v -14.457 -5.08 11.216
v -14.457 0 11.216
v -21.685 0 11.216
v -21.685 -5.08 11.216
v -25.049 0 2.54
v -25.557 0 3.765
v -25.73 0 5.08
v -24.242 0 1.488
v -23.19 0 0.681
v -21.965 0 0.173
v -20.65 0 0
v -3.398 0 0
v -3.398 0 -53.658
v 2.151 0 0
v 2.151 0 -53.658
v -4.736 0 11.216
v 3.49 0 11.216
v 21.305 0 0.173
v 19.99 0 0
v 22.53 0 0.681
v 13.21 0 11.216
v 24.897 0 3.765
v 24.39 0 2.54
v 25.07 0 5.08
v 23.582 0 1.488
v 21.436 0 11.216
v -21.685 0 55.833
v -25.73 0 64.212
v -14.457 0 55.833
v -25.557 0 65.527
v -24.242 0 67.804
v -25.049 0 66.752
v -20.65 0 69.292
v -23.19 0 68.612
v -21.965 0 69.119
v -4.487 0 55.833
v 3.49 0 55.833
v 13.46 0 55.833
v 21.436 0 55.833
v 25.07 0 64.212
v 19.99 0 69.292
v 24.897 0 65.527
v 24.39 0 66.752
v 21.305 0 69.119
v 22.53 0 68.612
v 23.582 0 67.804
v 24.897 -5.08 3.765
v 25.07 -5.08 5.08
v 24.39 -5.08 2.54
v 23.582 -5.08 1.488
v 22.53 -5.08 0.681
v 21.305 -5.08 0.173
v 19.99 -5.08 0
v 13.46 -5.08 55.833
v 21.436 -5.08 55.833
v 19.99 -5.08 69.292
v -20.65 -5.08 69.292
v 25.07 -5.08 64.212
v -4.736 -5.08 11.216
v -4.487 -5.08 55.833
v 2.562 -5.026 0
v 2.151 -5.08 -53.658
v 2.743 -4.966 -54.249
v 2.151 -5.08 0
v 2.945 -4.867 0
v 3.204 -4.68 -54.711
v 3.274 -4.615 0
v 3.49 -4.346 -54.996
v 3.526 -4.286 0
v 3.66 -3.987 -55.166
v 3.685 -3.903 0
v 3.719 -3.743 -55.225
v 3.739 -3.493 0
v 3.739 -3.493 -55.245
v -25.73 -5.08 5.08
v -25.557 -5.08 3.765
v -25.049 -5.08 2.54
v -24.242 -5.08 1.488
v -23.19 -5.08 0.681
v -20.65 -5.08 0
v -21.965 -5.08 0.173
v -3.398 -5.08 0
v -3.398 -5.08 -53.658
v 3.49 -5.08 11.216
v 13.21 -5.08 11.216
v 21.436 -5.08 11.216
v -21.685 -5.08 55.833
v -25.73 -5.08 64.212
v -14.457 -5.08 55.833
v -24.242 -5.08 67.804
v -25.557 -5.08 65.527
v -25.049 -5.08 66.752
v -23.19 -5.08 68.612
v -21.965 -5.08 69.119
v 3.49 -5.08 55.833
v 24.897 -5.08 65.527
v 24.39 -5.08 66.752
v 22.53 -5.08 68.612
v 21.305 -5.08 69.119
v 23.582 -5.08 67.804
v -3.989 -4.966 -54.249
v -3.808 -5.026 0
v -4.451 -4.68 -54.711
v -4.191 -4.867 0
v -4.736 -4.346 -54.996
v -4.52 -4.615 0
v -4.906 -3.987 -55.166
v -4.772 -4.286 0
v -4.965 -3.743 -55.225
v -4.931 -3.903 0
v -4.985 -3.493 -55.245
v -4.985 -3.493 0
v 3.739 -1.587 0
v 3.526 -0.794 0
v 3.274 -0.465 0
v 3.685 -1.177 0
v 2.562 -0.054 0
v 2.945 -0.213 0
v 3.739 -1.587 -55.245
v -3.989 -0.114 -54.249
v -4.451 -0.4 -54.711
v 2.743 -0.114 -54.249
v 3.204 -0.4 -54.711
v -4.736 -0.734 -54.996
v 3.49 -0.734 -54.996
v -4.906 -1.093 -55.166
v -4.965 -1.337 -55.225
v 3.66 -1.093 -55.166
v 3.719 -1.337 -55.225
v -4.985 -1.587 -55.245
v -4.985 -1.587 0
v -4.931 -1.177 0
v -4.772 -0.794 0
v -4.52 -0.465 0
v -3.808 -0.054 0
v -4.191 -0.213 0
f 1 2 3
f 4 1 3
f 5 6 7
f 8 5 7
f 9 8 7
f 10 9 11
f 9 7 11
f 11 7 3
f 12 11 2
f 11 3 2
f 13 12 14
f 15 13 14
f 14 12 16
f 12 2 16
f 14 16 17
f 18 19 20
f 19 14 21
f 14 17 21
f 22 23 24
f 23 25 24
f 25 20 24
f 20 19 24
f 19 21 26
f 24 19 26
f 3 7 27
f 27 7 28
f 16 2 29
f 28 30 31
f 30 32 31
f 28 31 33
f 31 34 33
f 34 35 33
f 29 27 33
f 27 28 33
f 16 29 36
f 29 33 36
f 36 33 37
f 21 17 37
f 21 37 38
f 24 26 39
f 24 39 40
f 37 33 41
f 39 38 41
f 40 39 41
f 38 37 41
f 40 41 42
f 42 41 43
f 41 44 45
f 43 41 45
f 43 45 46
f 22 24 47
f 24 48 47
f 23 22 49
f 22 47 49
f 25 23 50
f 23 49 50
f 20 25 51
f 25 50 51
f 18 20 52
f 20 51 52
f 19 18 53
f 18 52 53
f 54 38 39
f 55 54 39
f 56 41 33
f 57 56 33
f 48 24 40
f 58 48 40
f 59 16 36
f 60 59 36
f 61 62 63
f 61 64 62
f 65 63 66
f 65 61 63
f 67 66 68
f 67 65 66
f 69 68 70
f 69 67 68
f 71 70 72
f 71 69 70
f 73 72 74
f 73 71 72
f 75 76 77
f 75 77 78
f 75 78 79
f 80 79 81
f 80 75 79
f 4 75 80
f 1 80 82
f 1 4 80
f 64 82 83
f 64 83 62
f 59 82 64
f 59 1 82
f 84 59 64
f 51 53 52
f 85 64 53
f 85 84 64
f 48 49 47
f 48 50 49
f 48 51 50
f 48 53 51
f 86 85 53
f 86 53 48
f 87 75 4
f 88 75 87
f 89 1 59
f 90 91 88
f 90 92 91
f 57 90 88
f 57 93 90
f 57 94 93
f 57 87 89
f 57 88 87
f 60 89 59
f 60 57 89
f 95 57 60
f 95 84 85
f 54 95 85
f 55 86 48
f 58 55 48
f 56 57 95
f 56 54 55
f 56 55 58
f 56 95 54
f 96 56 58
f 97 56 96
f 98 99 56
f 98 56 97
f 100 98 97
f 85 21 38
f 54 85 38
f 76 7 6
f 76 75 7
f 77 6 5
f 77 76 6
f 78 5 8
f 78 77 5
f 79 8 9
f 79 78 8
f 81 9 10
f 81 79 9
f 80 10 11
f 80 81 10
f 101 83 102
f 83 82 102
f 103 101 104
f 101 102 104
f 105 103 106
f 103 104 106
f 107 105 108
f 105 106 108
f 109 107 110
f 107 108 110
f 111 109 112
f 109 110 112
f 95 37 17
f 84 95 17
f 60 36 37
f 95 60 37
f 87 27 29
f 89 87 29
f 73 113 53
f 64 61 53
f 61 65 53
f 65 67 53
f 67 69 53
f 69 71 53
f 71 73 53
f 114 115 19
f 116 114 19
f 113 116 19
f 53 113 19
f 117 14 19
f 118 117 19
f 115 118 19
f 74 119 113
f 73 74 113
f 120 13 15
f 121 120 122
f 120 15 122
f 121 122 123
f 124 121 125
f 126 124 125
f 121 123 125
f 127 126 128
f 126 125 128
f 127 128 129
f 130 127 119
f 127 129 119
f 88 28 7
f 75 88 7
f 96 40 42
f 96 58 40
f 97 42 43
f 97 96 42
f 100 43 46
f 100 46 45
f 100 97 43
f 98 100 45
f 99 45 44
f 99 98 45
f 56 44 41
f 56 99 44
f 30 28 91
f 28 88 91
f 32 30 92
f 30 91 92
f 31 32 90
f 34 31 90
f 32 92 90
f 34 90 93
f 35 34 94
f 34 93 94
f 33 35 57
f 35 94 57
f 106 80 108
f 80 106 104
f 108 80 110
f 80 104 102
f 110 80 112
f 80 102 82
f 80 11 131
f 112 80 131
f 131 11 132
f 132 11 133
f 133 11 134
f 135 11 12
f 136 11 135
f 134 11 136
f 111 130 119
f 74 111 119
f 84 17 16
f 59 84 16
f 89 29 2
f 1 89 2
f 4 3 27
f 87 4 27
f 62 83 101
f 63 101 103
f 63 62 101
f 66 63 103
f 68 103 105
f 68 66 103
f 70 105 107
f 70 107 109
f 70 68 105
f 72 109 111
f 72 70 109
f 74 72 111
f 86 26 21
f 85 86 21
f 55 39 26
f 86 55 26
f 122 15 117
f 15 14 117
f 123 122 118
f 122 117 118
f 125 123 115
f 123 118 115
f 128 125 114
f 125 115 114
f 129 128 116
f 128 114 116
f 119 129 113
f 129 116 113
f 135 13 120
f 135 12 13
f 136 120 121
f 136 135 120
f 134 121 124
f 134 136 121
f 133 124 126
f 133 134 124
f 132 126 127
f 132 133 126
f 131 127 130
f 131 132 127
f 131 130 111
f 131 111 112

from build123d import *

# Parameters (mm, degrees)
F0_W     = 8.723831
F0_H     = 55.245
F1_DEPTH = 5.08
F2_R     = 5.08
F3_R     = 5.08
F4_R     = 1.5875


with BuildPart() as f1:
    # F0 (on Front) → F1 (new body)
    with BuildSketch(Plane.XZ):
        Polygon((-25.729871, 69.29215), (-25.729871, 0), (-4.985048, 0), (3.738783, 0), (25.070129, 0), (25.070129, 69.29215), align=None)
        Polygon((-21.684954, 11.216355), (-21.684954, 51.844489), (-21.684954, 55.832524), (-14.456635, 55.832524), (-14.456635, 11.216355), align=None, mode=Mode.SUBTRACT)
        Polygon((-4.735794, 11.216355), (-4.486542, 55.832524), (3.489533, 55.832524), (3.489533, 11.216355), align=None, mode=Mode.SUBTRACT)
        Polygon((13.210376, 11.216355), (13.459626, 55.832524), (21.4357, 55.832524), (21.4357, 11.216355), align=None, mode=Mode.SUBTRACT)
        with Locations((-0.623133, -27.6225)):
            Rectangle(F0_W, F0_H)
    extrude(amount=F1_DEPTH)

    # F2
    f2_edges = [f1.edges().sort_by_distance(p)[0] for p in [
        (-25.729871, -2.54, 69.29215),
        (25.070129, -2.54, 69.29215),
    ]]
    fillet(f2_edges, radius=F2_R)

    # F3
    f3_edges = [f1.edges().sort_by_distance(p)[0] for p in [
        (-25.729871, -2.54, 0),
        (25.070129, -2.54, 0),
    ]]
    fillet(f3_edges, radius=F3_R)

    # F4
    f4_edges = [f1.edges().sort_by_distance(p)[0] for p in [
        (3.738783, 0, -27.6225),
        (-0.623132, 0, -55.245),
        (-4.985048, 0, -27.6225),
        (3.738783, -5.08, -27.6225),
        (-4.985048, -5.08, -27.6225),
        (-0.623132, -5.08, -55.245),
    ]]
    fillet(f4_edges, radius=F4_R)


solid = f1.part
